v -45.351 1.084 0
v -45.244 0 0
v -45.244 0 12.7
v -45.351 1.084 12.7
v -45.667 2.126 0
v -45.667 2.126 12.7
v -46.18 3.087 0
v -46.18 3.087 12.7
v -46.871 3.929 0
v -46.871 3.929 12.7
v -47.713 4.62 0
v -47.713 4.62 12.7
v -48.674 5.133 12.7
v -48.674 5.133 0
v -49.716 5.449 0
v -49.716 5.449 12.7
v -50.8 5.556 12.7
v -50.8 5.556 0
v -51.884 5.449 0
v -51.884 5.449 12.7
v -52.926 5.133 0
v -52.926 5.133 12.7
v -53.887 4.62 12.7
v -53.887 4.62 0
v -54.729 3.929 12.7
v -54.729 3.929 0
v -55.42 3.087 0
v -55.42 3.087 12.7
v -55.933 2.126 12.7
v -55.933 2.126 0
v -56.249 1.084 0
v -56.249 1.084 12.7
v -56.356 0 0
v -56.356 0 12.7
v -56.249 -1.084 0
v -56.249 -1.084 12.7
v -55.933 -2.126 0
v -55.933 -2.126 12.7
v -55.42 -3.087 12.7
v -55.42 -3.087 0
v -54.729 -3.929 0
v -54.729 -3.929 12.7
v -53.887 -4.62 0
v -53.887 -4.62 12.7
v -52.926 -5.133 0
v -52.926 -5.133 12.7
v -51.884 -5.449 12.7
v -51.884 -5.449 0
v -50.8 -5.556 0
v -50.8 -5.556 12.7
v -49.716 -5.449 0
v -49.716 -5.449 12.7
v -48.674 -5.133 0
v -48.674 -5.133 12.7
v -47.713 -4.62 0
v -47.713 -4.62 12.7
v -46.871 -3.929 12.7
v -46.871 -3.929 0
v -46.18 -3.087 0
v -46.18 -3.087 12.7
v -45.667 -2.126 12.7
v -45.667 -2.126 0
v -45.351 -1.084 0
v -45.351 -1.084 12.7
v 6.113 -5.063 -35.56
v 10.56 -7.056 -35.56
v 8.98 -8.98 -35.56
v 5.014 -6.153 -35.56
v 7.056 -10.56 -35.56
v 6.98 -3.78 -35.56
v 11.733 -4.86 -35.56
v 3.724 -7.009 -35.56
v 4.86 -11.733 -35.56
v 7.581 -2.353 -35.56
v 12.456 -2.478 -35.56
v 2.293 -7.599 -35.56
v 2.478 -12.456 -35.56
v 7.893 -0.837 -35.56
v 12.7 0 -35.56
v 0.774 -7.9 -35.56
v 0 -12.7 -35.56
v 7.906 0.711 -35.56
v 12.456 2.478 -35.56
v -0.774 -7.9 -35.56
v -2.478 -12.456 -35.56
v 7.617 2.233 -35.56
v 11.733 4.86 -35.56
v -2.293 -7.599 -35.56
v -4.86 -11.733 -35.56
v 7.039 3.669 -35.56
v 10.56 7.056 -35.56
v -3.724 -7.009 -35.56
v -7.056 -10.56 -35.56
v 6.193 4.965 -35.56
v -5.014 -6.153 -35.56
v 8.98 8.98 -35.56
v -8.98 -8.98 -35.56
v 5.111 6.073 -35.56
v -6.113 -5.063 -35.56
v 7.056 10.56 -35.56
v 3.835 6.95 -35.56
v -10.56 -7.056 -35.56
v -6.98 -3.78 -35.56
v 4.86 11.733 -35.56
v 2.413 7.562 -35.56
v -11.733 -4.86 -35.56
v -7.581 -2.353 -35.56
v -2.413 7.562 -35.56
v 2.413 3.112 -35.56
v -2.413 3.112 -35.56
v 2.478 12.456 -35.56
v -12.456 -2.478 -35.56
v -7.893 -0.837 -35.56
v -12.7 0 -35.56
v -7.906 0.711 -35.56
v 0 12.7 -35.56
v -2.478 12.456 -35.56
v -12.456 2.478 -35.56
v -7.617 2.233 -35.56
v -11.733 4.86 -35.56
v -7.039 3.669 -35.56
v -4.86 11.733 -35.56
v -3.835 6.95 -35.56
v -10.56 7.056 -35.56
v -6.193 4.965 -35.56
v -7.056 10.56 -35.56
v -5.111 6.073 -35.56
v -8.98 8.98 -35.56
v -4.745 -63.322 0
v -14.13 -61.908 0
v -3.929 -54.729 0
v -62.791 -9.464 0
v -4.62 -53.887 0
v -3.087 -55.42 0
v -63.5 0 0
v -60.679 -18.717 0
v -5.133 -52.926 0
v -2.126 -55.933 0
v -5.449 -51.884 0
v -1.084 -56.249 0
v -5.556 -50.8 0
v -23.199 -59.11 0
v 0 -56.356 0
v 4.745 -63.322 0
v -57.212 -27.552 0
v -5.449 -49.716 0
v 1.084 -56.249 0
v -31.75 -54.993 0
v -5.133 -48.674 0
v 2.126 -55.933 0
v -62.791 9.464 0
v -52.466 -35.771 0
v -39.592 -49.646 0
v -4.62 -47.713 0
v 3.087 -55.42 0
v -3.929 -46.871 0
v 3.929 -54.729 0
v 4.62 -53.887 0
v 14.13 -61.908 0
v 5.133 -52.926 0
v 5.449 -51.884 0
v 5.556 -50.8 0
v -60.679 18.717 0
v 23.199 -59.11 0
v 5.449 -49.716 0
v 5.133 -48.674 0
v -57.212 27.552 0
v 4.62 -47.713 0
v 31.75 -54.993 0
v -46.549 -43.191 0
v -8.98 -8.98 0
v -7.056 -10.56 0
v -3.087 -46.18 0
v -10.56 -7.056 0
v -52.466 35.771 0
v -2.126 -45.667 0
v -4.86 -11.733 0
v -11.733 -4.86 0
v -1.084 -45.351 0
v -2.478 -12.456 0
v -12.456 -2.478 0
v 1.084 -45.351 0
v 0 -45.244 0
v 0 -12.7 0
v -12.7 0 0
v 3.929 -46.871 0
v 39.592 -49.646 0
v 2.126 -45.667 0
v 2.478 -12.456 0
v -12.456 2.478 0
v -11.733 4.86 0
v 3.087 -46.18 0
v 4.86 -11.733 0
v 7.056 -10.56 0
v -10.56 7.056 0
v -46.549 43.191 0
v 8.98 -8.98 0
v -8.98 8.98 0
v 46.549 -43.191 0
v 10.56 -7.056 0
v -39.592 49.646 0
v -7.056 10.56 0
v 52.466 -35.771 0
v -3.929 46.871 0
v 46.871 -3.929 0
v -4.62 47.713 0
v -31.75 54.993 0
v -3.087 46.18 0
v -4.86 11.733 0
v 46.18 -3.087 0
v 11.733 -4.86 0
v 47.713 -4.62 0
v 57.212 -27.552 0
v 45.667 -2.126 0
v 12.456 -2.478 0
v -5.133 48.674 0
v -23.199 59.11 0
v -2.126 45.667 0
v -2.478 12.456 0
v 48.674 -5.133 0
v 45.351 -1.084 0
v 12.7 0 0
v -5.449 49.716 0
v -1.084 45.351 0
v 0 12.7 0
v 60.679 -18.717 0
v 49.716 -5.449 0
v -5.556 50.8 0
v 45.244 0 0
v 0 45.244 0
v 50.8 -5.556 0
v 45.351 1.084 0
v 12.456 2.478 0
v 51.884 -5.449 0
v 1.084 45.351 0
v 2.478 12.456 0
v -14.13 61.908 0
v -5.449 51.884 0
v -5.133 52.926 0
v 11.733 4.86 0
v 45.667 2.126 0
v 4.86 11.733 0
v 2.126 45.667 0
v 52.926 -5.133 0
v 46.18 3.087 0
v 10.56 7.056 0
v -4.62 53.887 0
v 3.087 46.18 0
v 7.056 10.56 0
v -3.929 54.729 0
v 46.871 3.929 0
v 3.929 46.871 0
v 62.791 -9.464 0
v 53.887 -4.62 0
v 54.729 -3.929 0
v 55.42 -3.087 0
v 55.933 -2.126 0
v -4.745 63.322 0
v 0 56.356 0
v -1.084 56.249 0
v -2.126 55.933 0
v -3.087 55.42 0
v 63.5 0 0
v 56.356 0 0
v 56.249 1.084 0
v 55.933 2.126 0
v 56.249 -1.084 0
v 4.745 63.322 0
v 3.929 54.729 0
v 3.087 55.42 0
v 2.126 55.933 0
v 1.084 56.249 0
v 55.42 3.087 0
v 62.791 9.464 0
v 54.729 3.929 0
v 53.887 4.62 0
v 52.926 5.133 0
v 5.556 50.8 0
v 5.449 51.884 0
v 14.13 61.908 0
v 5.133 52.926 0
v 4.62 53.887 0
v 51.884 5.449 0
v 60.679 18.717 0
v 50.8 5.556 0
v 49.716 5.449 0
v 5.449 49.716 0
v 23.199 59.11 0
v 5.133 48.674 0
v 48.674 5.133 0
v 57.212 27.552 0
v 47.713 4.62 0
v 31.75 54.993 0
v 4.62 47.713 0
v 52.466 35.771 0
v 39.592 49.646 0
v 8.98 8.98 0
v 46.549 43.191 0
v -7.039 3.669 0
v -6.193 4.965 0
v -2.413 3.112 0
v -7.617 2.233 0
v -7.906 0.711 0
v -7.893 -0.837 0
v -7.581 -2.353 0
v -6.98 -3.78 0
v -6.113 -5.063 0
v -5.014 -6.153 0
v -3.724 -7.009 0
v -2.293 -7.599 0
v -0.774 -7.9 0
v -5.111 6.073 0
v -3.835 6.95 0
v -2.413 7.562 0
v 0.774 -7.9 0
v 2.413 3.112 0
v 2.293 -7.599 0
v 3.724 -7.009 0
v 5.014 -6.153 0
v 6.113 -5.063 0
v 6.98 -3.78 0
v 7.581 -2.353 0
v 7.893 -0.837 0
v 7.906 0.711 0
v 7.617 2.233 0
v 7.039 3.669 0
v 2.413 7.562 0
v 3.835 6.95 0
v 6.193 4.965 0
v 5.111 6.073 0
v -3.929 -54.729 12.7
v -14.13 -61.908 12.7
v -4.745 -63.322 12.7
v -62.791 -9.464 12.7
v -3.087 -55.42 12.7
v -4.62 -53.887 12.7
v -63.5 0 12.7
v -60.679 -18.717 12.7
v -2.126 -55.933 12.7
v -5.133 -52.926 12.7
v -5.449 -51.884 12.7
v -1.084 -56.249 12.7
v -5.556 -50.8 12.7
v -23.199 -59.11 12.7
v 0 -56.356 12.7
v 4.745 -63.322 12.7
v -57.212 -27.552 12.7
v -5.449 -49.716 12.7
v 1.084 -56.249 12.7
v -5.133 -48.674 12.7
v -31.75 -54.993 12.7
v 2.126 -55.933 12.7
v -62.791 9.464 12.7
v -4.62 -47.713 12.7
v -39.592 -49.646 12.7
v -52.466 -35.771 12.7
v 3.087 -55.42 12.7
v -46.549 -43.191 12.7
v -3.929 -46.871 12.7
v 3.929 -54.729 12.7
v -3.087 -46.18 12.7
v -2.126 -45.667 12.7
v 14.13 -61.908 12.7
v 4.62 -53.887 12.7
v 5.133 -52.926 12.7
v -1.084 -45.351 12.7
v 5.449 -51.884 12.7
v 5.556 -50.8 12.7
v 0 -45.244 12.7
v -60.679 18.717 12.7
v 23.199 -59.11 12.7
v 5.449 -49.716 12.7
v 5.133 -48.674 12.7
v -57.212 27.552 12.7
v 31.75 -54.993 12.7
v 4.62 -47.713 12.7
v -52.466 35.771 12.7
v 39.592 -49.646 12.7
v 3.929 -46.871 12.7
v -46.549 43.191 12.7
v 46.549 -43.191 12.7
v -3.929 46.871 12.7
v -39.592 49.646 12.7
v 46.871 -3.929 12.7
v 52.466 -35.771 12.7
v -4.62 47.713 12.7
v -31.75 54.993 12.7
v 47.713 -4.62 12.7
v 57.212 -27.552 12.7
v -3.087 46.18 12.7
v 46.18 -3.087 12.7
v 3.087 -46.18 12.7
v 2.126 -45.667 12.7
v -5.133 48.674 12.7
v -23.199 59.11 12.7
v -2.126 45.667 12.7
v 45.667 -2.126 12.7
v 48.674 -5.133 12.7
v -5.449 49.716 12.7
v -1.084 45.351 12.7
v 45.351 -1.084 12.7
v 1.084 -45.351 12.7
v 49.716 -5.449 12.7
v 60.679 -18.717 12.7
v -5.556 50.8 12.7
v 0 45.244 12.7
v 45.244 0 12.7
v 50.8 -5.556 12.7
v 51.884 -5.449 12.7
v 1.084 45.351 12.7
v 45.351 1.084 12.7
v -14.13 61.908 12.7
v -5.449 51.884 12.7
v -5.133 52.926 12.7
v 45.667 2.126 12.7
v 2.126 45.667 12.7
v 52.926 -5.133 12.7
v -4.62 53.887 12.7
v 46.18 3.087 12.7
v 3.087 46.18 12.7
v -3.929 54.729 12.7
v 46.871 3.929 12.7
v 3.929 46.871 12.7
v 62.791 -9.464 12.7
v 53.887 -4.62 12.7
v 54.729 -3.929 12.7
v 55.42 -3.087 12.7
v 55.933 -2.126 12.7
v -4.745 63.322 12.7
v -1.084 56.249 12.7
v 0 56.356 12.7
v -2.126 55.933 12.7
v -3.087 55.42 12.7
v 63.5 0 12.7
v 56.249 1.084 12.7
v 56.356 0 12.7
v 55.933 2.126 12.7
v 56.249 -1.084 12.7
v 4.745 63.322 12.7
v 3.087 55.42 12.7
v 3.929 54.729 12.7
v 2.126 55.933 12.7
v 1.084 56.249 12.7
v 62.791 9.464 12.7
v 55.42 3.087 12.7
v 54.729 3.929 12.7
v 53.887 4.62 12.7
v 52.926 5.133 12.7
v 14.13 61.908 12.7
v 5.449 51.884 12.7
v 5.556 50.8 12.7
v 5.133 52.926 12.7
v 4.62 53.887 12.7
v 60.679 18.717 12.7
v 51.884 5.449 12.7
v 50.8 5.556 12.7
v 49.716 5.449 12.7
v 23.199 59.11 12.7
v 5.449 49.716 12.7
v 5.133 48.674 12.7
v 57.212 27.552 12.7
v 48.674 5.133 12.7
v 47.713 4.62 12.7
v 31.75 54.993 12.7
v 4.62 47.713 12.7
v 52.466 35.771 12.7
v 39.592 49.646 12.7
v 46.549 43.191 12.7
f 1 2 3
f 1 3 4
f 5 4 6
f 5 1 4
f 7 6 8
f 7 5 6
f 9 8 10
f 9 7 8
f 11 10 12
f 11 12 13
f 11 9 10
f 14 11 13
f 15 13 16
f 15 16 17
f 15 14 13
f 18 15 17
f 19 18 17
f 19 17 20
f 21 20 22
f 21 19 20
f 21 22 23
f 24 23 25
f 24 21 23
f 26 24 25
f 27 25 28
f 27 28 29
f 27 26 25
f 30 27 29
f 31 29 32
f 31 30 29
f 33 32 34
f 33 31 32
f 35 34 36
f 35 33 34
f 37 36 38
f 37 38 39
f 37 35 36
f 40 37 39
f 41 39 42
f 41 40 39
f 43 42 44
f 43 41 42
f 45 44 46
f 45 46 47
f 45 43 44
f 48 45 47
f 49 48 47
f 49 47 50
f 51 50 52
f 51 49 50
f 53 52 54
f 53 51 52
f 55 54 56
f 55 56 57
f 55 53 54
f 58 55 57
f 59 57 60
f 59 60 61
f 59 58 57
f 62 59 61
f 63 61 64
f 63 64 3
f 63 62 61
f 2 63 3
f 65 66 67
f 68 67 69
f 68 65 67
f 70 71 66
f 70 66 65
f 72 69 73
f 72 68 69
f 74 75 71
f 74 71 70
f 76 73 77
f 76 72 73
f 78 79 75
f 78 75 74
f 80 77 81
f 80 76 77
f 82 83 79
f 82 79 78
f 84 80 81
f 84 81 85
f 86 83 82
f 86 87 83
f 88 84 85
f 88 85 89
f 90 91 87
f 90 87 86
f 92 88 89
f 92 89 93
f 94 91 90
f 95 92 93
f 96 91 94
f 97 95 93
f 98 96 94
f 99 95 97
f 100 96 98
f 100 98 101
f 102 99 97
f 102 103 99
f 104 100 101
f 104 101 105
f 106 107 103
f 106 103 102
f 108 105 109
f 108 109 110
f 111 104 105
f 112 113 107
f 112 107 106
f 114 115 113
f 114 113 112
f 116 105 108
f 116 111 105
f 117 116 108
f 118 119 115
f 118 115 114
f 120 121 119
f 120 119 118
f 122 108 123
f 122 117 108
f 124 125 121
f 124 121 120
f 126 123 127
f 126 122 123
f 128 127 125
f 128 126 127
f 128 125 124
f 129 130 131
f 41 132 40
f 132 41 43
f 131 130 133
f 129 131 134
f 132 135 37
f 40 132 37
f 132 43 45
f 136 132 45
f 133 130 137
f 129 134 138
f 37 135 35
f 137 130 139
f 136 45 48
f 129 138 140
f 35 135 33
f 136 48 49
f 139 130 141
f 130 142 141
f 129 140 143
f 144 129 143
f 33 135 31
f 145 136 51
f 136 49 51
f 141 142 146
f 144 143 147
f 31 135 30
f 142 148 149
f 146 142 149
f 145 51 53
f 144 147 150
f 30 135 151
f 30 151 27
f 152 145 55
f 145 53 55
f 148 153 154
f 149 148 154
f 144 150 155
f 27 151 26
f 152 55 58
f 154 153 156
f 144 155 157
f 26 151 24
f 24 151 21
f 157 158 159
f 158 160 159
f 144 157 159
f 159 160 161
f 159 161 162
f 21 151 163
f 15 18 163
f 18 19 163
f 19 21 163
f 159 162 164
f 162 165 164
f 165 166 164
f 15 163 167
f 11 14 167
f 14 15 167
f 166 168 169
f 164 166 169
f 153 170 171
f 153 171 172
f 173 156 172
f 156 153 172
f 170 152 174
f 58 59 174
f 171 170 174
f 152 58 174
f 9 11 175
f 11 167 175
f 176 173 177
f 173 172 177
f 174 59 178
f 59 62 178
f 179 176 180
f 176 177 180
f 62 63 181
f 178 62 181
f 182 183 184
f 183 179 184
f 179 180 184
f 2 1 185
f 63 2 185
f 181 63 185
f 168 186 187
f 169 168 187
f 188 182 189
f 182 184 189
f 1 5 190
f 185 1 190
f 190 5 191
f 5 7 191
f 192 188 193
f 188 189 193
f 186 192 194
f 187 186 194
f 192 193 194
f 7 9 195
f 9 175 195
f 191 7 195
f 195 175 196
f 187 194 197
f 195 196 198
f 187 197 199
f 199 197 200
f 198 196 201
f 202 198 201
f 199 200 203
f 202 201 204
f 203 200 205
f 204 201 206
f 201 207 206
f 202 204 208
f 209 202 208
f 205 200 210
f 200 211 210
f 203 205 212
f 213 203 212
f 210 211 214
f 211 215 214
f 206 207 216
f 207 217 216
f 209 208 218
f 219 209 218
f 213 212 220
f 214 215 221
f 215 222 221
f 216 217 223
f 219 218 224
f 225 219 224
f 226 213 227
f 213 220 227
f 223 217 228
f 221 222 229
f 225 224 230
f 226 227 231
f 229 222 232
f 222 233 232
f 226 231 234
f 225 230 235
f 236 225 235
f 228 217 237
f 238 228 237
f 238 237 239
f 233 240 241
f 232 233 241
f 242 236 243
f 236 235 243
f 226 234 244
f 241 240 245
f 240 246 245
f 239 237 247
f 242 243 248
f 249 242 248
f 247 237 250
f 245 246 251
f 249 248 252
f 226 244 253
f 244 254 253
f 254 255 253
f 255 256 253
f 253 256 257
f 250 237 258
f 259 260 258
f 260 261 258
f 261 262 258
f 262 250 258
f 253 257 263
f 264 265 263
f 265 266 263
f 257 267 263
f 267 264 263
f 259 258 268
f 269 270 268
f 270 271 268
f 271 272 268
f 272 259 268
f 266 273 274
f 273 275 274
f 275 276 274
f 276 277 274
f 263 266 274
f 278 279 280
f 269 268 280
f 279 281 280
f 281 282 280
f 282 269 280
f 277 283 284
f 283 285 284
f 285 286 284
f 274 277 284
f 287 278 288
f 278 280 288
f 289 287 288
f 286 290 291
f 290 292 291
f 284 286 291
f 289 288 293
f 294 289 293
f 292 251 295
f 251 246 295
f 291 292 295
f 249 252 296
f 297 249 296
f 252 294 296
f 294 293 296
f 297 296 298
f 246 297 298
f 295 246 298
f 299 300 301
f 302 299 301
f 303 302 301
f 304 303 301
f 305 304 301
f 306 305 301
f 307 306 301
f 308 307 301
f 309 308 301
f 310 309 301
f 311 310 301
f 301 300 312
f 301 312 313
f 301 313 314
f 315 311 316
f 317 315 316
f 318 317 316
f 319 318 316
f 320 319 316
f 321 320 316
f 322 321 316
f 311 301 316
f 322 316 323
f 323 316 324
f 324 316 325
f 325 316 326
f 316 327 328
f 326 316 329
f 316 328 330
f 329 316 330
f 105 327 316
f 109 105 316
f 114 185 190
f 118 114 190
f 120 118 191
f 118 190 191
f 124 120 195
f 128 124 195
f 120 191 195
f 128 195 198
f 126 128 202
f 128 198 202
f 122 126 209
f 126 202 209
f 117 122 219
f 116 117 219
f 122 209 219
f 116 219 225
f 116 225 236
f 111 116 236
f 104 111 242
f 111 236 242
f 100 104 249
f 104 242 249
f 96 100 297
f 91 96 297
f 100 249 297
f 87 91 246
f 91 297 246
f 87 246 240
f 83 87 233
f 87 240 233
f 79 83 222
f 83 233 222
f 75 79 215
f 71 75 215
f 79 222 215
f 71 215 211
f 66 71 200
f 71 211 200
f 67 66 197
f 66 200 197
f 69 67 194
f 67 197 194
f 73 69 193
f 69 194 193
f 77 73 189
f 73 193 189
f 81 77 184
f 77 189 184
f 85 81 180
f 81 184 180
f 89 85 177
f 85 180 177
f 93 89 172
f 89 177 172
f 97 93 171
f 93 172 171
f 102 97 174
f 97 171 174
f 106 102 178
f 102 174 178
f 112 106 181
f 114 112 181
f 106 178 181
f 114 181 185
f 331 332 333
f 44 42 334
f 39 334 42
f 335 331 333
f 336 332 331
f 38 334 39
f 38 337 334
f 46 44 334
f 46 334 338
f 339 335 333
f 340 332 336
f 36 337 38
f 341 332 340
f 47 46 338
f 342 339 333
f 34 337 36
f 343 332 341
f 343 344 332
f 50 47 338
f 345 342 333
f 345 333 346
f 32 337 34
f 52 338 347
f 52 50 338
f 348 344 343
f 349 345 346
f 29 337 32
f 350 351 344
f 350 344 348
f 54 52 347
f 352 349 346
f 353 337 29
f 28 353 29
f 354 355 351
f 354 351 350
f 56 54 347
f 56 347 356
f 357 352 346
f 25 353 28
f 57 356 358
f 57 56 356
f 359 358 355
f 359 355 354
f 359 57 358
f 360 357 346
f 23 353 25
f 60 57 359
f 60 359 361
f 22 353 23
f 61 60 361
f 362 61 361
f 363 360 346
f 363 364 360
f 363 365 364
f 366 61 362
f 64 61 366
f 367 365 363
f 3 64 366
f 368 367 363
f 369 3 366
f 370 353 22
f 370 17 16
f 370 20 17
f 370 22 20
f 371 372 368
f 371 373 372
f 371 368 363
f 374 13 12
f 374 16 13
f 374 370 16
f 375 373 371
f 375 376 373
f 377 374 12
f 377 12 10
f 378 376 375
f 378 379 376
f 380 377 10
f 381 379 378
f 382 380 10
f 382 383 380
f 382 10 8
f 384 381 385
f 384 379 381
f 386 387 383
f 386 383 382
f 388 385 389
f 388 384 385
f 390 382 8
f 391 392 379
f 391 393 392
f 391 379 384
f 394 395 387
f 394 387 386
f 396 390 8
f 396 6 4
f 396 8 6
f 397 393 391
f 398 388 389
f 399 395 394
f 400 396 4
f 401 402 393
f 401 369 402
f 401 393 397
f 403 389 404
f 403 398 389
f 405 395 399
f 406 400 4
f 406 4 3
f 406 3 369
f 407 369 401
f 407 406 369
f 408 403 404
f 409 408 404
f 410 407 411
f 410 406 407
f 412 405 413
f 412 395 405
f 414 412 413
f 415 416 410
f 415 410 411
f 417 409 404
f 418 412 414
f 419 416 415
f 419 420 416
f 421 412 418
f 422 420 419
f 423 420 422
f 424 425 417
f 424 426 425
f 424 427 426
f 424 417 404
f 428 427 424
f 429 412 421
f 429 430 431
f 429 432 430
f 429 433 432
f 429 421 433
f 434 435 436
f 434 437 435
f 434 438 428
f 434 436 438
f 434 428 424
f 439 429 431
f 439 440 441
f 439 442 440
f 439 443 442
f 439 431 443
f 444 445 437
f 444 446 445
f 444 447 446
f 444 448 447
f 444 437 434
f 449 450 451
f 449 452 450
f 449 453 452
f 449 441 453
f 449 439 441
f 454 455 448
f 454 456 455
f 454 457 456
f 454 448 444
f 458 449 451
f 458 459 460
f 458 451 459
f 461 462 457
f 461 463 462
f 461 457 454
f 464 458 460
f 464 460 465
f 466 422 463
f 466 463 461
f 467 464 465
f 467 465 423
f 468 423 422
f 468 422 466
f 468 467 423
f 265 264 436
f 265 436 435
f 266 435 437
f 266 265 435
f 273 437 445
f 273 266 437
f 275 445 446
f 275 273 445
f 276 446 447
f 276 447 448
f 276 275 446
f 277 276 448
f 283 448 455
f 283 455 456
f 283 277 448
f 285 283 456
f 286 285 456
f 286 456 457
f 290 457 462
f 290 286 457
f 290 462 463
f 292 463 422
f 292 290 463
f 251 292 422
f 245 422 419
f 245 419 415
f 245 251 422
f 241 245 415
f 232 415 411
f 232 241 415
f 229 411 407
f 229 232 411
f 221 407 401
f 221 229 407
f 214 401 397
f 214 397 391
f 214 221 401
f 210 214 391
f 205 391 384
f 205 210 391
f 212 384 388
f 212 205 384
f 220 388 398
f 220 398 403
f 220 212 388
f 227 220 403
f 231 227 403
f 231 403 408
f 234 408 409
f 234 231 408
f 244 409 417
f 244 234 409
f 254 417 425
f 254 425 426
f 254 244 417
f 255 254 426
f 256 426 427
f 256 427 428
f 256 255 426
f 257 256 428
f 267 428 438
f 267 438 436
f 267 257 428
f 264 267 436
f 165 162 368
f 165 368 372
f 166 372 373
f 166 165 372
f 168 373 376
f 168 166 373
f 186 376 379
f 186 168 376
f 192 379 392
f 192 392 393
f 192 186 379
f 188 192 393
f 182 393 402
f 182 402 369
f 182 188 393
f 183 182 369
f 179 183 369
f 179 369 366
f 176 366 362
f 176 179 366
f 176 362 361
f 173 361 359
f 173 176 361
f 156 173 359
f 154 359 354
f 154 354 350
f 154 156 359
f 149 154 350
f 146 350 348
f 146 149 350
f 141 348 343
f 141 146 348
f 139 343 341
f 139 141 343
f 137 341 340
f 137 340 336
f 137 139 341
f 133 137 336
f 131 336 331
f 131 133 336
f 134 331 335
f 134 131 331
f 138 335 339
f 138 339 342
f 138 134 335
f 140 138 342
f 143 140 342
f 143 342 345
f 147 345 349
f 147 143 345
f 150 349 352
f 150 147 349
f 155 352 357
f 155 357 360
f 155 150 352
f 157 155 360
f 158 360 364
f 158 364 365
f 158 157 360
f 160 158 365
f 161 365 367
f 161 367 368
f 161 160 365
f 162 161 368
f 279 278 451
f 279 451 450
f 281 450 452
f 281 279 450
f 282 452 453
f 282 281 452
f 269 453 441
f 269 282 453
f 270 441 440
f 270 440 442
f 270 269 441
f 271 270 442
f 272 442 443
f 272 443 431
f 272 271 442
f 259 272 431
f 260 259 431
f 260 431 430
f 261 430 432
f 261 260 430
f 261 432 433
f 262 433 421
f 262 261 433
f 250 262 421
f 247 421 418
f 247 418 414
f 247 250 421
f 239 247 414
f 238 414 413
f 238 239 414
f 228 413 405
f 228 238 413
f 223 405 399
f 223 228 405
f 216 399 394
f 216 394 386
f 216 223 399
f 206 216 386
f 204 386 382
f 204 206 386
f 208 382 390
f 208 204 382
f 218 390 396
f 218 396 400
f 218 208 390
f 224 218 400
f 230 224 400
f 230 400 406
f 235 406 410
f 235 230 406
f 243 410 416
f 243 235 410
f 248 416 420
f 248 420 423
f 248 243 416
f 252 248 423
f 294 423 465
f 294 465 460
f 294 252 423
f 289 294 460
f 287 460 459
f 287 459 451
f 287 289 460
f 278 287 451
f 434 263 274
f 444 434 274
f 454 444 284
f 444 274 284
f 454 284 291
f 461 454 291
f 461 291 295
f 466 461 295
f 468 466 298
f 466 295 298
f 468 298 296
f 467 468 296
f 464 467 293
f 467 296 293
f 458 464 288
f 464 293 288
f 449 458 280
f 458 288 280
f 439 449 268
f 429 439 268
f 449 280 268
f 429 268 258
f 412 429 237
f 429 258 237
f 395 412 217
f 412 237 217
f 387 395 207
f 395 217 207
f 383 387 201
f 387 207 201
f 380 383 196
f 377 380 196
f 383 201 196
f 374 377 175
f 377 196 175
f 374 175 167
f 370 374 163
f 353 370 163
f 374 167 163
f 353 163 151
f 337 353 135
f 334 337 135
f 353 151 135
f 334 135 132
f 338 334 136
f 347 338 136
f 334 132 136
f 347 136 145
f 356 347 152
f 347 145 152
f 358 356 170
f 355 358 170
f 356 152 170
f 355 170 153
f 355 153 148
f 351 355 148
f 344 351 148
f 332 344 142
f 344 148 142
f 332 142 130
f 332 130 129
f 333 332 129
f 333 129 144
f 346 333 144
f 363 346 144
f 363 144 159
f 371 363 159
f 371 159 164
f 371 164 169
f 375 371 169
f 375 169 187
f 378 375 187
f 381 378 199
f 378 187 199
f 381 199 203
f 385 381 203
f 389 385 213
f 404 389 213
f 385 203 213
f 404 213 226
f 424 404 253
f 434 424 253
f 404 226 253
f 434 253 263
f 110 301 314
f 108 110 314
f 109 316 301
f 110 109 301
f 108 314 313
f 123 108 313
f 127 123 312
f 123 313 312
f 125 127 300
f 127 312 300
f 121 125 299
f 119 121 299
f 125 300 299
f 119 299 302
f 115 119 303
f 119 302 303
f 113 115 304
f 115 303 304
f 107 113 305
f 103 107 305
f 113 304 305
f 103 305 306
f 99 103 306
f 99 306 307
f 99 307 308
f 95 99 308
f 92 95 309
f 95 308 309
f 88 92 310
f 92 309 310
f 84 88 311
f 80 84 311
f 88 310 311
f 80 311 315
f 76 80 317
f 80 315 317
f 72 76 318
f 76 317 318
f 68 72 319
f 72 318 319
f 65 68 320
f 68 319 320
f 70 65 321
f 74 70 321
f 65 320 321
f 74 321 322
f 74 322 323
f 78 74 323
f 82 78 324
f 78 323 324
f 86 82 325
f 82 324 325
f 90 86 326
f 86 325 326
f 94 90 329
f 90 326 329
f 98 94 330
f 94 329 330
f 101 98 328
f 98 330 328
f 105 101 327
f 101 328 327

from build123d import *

# Parameters (mm, degrees)
SKETCH1_R           = 63.5
SKETCH1_R_2         = 5.55625
BOSS_EXTRUDE1_DEPTH = 12.7
SKETCH2_R           = 12.7
BOSS_EXTRUDE2_DEPTH = 35.56


with BuildPart() as part:
    # Sketch1 → Boss-Extrude1 (new body)
    with BuildSketch(Plane.XY):
        Circle(SKETCH1_R)
        with Locations((-50.8, 0)):
            Circle(SKETCH1_R_2, mode=Mode.SUBTRACT)
        with Locations((0, 50.8)):
            Circle(SKETCH1_R_2, mode=Mode.SUBTRACT)
        with Locations((50.8, 0)):
            Circle(SKETCH1_R_2, mode=Mode.SUBTRACT)
        with Locations((0, -50.8)):
            Circle(SKETCH1_R_2, mode=Mode.SUBTRACT)
    extrude(amount=BOSS_EXTRUDE1_DEPTH)

    # Sketch2 → Boss-Extrude2 (add)
    with BuildSketch(Plane(origin=(0, 0, 0), x_dir=(-1, 0, 0), z_dir=(0, 0, -1))):
        Circle(SKETCH2_R)
        with BuildLine():
            Line((-2.413, 7.561834252), (-2.413, 3.1115))
            Line((-2.413, 3.1115), (2.413, 3.1115))
            Line((2.413, 3.1115), (2.413, 7.561834252))
            ThreePointArc((2.413, 7.561834252), (0, -7.9375), (-2.413, 7.561834252))
        make_face(mode=Mode.SUBTRACT)
    extrude(amount=BOSS_EXTRUDE2_DEPTH)


solid = part.part
